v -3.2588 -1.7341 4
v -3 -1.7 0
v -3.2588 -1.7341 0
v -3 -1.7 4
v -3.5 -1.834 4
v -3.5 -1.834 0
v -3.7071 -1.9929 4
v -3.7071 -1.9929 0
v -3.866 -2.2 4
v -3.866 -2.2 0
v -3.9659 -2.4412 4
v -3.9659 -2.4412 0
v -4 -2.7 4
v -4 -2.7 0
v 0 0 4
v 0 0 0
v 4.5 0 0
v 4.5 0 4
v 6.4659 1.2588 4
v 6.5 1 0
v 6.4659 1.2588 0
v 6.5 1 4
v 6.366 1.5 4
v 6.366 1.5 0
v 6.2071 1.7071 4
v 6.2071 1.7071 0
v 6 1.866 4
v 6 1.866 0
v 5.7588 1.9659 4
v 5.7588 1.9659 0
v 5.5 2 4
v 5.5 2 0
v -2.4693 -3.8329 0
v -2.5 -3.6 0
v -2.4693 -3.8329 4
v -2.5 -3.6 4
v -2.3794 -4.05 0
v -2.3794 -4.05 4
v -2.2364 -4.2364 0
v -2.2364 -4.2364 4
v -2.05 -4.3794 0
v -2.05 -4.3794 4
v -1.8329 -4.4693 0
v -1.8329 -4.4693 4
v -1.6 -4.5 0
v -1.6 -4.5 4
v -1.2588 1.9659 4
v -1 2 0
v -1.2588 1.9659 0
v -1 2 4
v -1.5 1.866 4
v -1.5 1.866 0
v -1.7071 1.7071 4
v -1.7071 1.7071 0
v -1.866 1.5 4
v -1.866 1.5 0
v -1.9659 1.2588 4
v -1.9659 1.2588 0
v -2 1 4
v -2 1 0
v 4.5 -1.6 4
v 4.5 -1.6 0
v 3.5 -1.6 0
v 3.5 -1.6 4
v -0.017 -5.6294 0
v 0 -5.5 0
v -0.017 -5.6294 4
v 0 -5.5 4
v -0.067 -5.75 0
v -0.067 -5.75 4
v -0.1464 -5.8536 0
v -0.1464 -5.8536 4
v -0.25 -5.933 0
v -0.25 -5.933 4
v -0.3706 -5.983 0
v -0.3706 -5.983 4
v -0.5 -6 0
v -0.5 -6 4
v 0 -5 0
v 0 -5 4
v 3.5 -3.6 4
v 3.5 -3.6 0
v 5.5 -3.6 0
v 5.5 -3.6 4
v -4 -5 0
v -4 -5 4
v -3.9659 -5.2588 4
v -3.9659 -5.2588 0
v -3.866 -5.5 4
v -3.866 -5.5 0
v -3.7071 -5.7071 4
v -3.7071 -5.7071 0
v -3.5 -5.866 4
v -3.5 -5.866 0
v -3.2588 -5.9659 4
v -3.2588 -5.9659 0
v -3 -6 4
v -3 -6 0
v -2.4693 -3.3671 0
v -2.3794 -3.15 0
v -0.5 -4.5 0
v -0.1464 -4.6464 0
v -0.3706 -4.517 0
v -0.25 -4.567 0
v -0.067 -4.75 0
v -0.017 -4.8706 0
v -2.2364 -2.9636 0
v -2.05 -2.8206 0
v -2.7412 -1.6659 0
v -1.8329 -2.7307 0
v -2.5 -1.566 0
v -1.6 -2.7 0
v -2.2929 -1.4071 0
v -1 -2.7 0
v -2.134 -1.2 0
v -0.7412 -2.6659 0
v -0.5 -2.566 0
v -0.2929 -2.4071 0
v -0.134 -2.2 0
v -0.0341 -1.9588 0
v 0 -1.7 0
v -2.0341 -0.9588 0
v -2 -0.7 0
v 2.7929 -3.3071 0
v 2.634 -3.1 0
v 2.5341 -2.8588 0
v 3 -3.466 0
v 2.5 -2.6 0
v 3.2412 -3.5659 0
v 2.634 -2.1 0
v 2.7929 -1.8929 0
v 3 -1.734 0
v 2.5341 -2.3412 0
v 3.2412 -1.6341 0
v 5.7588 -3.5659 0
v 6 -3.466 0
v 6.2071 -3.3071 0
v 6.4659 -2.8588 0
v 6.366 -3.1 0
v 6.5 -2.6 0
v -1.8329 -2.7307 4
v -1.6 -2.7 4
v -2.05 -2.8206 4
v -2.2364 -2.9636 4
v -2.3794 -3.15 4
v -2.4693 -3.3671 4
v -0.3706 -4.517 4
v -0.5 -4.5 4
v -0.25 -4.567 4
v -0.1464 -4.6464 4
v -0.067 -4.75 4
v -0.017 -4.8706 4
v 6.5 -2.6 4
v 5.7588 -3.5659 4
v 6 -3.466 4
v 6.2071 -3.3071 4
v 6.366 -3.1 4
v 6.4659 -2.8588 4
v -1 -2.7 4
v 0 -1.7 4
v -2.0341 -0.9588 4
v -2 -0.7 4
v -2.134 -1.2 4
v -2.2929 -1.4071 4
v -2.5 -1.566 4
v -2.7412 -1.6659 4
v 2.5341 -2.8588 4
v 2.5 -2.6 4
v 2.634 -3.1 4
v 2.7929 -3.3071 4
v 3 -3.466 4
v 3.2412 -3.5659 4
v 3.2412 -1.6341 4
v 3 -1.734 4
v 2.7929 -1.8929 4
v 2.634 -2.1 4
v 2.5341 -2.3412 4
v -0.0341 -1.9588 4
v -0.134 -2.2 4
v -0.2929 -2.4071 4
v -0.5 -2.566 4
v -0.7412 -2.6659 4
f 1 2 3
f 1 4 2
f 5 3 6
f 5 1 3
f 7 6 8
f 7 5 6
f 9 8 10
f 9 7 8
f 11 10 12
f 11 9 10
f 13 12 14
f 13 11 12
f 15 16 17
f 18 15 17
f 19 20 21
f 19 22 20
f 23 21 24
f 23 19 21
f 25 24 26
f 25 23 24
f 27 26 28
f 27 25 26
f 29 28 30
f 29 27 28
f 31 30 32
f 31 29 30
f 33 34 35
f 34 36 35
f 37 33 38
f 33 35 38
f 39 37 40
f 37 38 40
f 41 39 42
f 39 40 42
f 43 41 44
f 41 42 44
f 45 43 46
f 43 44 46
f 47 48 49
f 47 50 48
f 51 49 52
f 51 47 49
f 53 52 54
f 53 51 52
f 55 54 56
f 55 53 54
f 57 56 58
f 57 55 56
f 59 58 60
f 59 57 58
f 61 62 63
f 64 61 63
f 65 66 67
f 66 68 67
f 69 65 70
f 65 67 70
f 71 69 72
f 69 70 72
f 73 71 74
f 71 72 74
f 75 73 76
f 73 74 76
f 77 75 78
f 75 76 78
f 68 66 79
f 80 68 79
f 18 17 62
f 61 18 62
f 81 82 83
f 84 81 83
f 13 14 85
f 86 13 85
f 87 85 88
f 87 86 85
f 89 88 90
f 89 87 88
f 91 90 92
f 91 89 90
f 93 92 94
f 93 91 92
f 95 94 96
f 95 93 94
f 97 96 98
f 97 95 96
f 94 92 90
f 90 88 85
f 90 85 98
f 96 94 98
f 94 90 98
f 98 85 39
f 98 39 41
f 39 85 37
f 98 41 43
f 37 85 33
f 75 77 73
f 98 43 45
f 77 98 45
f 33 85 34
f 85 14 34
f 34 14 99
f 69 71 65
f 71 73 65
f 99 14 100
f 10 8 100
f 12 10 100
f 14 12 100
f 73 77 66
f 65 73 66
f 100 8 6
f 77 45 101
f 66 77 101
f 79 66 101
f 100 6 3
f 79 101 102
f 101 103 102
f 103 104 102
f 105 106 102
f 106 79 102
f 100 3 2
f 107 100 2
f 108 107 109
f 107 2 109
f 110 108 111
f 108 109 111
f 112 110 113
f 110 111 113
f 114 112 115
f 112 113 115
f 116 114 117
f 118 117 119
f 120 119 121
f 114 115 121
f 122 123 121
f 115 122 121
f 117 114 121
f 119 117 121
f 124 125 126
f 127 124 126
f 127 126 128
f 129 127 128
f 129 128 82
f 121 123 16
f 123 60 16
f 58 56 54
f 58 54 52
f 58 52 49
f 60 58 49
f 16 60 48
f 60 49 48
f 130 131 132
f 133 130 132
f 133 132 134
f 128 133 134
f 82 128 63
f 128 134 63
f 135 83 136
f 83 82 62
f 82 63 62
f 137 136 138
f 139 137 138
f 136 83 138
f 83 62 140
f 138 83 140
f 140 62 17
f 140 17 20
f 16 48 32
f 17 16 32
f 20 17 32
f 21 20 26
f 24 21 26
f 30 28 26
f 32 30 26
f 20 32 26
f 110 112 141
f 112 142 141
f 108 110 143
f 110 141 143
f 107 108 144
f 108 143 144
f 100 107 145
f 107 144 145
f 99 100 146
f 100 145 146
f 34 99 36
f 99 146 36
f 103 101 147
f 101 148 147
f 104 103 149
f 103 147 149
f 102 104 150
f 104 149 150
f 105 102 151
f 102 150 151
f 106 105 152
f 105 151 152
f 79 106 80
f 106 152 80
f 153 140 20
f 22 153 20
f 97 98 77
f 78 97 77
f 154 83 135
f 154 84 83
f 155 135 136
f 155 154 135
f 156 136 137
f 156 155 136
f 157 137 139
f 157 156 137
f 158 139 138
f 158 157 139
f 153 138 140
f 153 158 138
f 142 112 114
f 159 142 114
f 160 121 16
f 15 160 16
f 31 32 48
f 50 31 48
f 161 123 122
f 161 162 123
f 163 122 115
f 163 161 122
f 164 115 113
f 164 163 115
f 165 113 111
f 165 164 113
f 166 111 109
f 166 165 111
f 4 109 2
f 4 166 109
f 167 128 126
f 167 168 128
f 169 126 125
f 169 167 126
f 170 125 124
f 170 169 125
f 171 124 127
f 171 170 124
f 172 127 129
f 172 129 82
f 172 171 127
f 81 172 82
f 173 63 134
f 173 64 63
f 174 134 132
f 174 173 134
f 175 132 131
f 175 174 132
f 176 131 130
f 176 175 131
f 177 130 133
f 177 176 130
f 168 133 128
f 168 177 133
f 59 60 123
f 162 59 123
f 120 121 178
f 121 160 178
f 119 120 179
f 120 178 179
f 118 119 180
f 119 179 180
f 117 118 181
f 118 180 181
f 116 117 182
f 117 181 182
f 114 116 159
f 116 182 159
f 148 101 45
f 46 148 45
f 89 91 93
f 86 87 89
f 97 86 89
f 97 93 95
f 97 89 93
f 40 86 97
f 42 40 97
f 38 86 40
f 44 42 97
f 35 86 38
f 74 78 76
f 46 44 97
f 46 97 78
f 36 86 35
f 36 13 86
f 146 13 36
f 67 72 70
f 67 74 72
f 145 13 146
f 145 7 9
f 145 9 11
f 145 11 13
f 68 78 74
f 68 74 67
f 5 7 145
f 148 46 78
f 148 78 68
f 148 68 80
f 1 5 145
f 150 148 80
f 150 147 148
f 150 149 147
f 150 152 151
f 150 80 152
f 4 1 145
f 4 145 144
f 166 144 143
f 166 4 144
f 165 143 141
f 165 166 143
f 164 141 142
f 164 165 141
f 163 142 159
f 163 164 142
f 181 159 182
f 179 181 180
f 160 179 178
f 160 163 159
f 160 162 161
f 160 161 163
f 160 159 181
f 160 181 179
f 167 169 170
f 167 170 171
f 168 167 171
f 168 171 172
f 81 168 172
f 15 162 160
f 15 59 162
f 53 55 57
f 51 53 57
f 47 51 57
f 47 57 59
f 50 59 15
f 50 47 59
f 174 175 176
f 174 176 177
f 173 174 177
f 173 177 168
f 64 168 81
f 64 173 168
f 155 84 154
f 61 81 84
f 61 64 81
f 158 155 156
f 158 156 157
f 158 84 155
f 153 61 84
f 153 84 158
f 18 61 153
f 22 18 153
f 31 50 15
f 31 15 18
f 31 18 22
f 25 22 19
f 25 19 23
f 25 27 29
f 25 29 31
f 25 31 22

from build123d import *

# Parameters (mm, degrees)
F1_DEPTH = 4
F2_R     = 0.99999
F3_R     = 0.89999
F4_R     = 0.5


# Not quite as in the source:
# - a fillet or chamfer is up to 0.001 mm smaller than in the source, because OpenCascade refuses the exact size


with BuildPart() as f1:
    # F0 (on Top) → F1 (new body)
    with BuildSketch(Plane.XY):
        Polygon((0, -2.7), (0, 0), (4.5, 0), (4.5, -1.6), (2.5, -1.6), (2.5, -3.6), (6.5, -3.6), (6.5, 2), (-2, 2), (-2, -1.7), (-4, -1.7), (-4, -6), (0, -6), (0, -4.5), (-2.5, -4.5), (-2.5, -2.7), align=None)
    extrude(amount=F1_DEPTH)

    # F2 (radius 1 in the source; OpenCascade refuses exactly that, so slightly less here)
    f2_edges = [f1.edges().sort_by_distance(p)[0] for p in [
        (6.5, -3.6, 2),
        (6.5, 2, 2),
        (-2, 2, 2),
        (-2, -1.7, 2),
        (-4, -1.7, 2),
        (-4, -6, 2),
        (2.5, -3.6, 2),
        (0, -2.7, 2),
        (2.5, -1.6, 2),
    ]]
    fillet(f2_edges, radius=F2_R)

    # F3 (radius 0.9 in the source; OpenCascade refuses exactly that, so slightly less here)
    f3_edges = [f1.edges().sort_by_distance(p)[0] for p in [
        (-2.5, -2.7, 2),
        (-2.5, -4.5, 2),
    ]]
    fillet(f3_edges, radius=F3_R)

    # F4
    f4_edges = [f1.edges().sort_by_distance(p)[0] for p in [
        (0, -6, 2),
        (0, -4.5, 2),
    ]]
    fillet(f4_edges, radius=F4_R)


solid = f1.part
